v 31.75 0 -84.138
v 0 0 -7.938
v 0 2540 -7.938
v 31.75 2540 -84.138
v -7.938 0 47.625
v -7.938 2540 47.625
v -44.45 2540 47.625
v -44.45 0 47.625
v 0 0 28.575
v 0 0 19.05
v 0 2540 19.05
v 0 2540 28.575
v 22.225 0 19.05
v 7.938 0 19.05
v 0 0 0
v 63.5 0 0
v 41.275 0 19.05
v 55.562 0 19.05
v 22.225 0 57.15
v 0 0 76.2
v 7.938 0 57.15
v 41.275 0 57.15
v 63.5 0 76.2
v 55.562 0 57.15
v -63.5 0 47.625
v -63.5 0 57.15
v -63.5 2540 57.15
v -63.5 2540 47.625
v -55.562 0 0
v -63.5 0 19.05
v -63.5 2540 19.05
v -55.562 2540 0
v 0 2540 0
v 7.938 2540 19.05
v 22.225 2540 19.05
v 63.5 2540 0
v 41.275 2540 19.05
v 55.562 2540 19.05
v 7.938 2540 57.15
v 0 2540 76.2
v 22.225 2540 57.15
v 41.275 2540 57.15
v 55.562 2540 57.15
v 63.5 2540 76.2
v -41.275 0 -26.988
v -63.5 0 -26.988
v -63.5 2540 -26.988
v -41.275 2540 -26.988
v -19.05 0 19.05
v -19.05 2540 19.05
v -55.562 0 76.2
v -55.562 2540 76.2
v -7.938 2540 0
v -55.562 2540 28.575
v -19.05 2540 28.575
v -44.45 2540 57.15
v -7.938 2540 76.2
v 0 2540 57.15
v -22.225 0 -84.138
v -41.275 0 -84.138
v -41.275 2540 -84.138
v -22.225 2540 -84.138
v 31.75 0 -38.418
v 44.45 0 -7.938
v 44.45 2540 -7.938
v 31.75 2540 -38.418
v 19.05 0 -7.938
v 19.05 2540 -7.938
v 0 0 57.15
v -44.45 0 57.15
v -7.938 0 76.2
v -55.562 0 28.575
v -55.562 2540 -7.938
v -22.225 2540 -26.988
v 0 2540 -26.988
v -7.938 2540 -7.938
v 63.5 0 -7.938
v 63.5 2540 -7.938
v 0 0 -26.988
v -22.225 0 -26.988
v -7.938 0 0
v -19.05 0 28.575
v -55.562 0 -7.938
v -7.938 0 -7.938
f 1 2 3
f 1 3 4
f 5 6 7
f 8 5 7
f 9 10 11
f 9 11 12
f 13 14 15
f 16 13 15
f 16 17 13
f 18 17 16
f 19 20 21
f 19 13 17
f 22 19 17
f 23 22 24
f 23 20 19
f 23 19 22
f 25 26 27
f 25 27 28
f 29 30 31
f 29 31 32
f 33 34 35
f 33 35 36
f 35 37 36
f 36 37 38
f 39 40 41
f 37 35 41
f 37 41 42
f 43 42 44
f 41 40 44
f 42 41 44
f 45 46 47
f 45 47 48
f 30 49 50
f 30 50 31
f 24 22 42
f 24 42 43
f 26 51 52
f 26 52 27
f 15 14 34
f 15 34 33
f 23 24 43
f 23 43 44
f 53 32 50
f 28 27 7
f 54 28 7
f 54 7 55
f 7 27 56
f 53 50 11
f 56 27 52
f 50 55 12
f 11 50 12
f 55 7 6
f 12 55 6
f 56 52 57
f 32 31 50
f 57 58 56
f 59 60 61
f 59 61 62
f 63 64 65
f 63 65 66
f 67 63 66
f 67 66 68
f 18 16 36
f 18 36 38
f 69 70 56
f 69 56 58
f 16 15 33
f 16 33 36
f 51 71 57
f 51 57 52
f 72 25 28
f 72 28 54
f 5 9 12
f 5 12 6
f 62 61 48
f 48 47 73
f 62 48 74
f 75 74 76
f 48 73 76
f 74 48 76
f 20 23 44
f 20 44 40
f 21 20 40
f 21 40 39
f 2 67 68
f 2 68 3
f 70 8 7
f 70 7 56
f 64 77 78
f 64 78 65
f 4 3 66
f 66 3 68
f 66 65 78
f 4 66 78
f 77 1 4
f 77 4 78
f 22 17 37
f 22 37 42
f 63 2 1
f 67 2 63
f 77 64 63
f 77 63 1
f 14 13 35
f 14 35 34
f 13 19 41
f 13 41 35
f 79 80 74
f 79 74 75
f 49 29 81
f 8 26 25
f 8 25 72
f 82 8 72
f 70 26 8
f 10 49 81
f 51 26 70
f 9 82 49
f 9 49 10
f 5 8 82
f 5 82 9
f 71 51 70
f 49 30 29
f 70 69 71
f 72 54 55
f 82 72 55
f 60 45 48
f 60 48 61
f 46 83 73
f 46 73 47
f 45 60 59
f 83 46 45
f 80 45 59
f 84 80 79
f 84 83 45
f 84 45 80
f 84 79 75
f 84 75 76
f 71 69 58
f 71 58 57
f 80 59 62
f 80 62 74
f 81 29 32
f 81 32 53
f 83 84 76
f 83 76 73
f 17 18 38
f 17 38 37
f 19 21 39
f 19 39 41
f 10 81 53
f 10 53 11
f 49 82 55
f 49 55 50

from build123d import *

# Parameters (mm, degrees)
F1_DEPTH = 2540


with BuildPart() as f1:
    # F0 (on Front) → F1 (new body)
    with BuildSketch(Plane.XZ):
        Polygon((0, 57.15), (-7.9375, 76.2), (-55.5625, 76.2), (-63.5, 57.15), (-63.5, 47.625), (-55.5625, 28.575), (-19.05, 28.575), (-19.05, 19.05), (-63.5, 19.05), (-55.5625, 0), (-7.9375, 0), (0, 19.05), (0, 28.575), (-7.9375, 47.625), (-44.45, 47.625), (-44.45, 57.15), align=None)
        Polygon((7.9375, 19.05), (0, 0), (63.5, 0), (55.5625, 19.05), (41.275, 19.05), (41.275, 57.15), (55.5625, 57.15), (63.5, 76.2), (0, 76.2), (7.9375, 57.15), (22.225, 57.15), (22.225, 19.05), align=None)
        Polygon((0, -26.9875), (-7.9375, -7.9375), (-55.5625, -7.9375), (-63.5, -26.9875), (-41.275, -26.9875), (-41.275, -84.1375), (-22.225, -84.1375), (-22.225, -26.9875), align=None)
        Polygon((19.05, -7.9375), (0, -7.9375), (31.75, -84.1375), (63.5, -7.9375), (44.45, -7.9375), (31.75, -38.4175), align=None)
    extrude(amount=-F1_DEPTH)


solid = f1.part
